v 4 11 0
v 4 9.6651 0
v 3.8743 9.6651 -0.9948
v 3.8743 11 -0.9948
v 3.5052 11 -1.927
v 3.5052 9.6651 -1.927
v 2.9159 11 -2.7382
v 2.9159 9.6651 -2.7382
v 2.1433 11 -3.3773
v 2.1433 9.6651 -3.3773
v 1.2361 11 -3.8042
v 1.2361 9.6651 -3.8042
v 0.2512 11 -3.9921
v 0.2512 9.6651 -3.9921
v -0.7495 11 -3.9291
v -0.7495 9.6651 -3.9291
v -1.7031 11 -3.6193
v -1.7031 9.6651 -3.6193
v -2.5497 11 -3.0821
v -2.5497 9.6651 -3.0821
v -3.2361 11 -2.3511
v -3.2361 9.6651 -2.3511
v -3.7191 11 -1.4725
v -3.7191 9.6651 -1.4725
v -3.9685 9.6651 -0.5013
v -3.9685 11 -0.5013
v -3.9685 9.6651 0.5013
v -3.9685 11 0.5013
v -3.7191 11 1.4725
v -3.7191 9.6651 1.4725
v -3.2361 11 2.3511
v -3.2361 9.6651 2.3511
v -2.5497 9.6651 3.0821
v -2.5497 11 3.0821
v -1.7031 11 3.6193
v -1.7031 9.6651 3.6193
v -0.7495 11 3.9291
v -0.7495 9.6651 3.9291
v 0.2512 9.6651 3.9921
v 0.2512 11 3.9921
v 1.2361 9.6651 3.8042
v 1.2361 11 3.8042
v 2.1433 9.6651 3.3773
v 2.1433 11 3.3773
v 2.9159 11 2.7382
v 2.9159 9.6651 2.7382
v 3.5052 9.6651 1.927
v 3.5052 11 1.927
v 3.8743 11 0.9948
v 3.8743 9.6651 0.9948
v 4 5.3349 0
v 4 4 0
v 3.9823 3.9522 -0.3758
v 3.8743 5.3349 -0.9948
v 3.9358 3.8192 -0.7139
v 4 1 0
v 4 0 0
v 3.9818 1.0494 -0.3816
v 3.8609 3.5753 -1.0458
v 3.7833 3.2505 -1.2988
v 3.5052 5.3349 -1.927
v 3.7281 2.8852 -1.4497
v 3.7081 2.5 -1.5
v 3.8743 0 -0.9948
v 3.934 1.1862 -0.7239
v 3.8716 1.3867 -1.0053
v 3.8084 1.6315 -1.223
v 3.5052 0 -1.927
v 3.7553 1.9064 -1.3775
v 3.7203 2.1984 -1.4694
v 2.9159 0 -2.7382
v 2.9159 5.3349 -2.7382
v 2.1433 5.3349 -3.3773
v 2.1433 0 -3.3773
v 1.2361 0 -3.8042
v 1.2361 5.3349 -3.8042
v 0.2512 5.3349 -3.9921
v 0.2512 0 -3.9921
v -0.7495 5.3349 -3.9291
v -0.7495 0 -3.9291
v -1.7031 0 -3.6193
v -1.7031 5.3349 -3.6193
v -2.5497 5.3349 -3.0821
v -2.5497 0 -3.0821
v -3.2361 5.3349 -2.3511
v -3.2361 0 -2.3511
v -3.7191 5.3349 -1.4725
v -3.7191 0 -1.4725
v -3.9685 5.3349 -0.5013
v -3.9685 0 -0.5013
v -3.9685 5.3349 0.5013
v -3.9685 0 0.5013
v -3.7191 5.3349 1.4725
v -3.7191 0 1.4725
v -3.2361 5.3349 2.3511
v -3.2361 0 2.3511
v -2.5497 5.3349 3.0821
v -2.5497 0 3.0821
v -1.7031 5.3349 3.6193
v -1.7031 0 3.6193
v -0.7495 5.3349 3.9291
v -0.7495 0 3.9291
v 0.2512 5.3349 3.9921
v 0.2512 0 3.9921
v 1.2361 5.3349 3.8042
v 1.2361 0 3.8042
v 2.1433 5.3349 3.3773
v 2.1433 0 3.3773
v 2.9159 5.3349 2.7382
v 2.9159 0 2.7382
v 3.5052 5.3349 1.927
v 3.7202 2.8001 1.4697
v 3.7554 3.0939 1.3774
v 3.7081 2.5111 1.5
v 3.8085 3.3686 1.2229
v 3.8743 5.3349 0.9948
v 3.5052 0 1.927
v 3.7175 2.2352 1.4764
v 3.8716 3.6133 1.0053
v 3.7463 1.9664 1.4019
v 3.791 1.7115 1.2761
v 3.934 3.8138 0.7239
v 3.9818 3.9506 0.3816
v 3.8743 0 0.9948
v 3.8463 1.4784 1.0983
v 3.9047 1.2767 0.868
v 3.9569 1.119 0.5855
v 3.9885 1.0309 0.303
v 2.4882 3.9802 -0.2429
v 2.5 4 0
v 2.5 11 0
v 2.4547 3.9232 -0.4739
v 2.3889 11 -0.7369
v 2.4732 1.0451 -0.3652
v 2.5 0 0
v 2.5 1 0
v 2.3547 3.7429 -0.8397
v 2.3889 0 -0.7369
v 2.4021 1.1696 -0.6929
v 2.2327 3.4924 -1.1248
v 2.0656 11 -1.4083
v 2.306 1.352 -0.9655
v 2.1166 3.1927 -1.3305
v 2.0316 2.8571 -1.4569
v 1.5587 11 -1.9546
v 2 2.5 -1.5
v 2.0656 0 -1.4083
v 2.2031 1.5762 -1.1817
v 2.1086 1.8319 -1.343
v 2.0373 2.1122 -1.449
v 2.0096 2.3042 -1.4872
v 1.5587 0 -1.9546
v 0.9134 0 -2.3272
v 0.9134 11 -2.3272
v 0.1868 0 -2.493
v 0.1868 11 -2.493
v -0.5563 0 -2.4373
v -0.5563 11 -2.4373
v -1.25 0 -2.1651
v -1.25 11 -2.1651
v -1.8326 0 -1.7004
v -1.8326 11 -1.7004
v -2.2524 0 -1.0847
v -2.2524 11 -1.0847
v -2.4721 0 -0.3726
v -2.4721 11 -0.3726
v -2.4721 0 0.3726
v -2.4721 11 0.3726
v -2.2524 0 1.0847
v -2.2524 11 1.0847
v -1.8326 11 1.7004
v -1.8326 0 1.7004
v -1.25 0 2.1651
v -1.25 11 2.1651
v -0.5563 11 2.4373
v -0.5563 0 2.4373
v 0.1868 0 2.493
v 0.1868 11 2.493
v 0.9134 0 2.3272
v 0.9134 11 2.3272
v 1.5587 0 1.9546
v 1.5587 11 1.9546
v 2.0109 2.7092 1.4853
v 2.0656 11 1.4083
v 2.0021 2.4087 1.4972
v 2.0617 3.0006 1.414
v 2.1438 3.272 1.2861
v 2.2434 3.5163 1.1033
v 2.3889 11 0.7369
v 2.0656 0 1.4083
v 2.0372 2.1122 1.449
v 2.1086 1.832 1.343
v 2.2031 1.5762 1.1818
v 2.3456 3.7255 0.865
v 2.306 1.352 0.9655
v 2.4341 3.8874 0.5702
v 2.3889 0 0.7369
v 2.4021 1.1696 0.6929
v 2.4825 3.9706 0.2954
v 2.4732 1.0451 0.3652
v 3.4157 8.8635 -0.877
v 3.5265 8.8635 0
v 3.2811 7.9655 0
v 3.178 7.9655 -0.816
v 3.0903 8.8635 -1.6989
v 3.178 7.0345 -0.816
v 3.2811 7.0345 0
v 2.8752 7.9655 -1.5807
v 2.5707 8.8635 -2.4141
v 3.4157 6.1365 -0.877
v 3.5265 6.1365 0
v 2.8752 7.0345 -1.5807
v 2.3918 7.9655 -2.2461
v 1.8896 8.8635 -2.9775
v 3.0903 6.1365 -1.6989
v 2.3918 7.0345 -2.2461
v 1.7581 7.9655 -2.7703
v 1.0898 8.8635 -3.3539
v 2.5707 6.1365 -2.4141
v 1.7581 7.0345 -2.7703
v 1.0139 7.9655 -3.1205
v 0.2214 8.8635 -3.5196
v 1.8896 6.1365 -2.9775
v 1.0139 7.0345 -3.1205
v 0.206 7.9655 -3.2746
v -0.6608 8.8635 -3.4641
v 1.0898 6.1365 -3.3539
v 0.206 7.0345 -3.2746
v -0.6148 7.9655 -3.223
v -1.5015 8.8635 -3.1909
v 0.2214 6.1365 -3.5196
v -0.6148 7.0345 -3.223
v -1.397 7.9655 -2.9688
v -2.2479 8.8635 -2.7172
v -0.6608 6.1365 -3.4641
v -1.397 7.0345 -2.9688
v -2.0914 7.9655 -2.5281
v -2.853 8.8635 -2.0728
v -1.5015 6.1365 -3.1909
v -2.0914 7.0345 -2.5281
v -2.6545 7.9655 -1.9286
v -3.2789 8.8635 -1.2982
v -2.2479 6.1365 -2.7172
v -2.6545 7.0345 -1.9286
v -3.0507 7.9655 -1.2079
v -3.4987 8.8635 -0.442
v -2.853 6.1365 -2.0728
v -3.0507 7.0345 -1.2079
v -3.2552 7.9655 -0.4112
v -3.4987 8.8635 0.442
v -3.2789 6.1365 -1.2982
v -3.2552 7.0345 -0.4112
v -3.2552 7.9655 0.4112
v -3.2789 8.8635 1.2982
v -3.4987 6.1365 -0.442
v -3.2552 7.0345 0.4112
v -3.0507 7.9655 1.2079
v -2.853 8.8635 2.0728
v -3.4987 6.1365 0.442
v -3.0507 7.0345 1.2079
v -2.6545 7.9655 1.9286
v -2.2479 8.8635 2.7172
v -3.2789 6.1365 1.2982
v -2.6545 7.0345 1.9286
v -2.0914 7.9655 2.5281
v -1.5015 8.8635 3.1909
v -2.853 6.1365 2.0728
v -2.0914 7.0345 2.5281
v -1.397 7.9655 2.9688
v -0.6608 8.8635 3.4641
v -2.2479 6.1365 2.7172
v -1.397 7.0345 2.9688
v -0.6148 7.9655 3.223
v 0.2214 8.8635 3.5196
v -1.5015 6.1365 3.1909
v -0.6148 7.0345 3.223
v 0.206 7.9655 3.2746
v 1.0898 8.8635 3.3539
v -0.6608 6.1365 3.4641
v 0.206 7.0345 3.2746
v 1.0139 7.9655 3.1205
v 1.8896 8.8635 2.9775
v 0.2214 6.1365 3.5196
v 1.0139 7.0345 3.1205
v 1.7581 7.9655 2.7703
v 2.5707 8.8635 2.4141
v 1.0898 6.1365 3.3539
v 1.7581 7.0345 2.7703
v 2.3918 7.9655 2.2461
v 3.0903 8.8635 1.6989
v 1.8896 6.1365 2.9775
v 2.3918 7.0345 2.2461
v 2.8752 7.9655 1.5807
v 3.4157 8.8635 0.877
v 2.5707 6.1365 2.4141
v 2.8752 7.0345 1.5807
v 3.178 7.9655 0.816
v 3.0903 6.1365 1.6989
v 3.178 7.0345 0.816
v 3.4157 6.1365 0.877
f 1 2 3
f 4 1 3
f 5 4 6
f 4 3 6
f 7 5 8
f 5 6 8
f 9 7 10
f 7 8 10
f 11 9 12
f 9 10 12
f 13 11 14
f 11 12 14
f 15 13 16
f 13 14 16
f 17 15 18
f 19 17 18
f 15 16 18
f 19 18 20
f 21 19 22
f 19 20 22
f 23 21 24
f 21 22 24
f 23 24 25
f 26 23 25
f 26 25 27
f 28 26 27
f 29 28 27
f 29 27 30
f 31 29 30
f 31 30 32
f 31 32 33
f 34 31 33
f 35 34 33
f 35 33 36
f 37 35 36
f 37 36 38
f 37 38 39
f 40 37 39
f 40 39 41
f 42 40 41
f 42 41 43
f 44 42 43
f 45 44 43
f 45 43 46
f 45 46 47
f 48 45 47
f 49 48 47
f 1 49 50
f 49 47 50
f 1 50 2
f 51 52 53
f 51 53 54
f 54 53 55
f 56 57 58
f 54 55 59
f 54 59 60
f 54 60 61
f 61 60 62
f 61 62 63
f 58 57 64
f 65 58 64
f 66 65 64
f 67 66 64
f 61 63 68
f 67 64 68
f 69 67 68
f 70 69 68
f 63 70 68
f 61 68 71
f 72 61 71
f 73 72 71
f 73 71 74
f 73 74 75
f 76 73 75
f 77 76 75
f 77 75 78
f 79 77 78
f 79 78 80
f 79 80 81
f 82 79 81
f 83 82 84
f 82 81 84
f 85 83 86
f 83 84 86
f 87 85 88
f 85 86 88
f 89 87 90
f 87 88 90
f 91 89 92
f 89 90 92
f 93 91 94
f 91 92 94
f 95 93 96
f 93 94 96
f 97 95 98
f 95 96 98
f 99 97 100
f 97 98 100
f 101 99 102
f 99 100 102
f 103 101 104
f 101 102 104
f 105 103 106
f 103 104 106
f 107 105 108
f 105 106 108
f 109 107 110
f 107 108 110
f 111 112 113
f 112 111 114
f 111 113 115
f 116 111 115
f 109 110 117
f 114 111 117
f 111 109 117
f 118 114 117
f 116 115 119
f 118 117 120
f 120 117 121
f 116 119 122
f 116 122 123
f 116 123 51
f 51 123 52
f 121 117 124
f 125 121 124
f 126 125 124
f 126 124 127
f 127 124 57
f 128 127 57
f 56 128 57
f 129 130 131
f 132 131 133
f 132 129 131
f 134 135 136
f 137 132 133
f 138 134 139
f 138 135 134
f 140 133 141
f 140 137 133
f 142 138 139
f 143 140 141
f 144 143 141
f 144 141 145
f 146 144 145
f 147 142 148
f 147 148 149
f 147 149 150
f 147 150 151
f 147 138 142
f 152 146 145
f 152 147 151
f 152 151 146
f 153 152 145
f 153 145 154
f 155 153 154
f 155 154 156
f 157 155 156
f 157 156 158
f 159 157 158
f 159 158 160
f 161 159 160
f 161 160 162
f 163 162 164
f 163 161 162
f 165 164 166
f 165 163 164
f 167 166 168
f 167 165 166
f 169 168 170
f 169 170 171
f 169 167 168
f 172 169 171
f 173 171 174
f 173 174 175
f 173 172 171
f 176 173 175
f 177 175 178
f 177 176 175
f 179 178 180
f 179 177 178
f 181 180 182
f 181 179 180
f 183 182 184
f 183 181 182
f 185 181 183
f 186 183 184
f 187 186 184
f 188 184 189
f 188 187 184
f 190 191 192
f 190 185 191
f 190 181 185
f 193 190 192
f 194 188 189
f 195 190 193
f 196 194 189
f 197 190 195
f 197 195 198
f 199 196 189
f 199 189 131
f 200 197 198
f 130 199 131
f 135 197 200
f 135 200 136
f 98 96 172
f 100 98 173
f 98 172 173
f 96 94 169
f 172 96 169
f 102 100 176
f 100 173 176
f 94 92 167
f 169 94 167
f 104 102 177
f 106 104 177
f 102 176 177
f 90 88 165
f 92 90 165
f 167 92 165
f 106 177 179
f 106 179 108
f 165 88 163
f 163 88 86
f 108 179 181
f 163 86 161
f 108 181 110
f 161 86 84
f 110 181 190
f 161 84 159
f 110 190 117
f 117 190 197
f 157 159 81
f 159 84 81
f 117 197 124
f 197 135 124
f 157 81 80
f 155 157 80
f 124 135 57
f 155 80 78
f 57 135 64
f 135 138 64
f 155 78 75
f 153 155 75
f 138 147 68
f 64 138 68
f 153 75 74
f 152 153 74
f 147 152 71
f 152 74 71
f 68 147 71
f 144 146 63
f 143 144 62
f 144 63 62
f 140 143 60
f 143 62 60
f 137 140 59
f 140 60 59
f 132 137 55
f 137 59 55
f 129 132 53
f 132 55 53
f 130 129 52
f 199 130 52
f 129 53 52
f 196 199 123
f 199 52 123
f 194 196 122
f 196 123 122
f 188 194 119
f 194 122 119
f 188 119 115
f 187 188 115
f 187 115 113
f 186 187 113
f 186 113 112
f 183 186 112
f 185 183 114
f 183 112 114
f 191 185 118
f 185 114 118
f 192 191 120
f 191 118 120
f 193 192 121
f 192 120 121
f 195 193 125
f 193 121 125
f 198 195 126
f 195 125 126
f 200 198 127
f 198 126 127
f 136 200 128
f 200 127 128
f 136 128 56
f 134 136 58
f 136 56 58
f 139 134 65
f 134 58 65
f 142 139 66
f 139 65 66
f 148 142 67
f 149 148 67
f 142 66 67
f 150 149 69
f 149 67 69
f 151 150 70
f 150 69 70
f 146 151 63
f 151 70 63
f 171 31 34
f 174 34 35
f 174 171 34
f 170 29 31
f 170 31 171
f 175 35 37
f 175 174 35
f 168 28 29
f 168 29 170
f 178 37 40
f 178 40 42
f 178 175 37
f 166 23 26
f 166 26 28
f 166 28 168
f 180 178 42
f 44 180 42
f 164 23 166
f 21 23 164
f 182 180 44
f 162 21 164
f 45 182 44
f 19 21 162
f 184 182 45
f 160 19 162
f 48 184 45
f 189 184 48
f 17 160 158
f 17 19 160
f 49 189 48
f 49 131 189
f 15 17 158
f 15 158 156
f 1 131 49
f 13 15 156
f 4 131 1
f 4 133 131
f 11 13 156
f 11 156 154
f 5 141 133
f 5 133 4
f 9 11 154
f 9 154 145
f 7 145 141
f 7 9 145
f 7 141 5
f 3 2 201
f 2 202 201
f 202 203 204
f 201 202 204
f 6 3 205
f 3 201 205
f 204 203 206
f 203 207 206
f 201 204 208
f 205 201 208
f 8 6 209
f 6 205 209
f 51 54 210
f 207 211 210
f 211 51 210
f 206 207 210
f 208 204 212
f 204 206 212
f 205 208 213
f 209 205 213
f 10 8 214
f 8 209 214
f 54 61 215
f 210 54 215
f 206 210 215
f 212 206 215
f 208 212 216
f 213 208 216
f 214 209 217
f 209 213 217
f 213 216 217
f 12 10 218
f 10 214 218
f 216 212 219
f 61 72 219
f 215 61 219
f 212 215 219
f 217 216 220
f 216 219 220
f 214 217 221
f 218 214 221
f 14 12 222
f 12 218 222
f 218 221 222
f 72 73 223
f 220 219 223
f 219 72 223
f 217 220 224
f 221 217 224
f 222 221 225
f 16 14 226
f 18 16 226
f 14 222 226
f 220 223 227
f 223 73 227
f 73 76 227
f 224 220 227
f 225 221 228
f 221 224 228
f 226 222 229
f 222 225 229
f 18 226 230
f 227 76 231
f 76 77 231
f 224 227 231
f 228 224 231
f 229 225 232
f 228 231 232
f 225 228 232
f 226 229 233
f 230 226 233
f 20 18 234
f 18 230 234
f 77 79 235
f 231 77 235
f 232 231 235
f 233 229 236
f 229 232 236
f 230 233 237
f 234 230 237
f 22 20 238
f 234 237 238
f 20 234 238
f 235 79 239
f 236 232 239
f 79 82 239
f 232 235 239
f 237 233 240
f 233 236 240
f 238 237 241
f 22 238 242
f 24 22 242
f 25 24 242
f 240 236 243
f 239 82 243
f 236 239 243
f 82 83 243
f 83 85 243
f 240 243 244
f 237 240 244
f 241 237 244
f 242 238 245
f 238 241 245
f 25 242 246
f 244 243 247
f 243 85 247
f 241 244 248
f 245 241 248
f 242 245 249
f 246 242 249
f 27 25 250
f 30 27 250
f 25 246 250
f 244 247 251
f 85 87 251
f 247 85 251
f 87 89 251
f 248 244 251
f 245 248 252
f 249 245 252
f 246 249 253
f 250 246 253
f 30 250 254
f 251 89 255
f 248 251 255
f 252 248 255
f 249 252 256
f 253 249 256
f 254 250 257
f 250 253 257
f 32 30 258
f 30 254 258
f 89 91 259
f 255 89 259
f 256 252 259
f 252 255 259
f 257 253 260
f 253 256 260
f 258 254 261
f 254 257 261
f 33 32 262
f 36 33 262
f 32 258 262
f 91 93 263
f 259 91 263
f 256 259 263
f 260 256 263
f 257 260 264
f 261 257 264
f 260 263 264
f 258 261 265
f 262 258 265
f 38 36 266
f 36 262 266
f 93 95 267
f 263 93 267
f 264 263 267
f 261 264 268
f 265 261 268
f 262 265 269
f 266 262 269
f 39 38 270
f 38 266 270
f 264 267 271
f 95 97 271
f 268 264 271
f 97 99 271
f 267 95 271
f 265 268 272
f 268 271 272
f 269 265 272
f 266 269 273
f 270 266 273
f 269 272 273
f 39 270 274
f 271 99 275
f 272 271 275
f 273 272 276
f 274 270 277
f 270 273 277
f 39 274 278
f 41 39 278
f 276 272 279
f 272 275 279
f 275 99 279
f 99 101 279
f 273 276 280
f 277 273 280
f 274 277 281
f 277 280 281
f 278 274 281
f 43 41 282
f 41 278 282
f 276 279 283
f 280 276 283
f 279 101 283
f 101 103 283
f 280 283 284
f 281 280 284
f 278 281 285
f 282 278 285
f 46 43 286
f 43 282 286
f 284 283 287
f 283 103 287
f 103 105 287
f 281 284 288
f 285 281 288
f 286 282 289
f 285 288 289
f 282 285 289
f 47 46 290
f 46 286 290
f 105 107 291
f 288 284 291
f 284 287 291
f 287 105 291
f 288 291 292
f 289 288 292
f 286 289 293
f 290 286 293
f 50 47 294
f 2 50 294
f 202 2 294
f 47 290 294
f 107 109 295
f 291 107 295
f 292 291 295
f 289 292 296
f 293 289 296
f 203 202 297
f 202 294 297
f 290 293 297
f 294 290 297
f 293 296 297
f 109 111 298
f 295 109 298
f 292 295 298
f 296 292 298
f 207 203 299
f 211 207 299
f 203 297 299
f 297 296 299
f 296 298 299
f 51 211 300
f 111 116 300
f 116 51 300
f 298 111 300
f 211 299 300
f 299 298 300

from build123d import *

# Parameters (mm, degrees)
CROQUIS1_R              = 4
CROQUIS1_R_2            = 2.5
SALIENTE_EXTRUIR1_DEPTH = 11
CROQUIS2_R              = 1.5
CORTAR_EXTRUIR2_DEPTH   = 2
CROQUIS3_R              = 3.5
CROQUIS3_R_2            = 3


with BuildPart() as part:
    # Croquis1 → Saliente-Extruir1 (new body)
    with BuildSketch(Plane(origin=(0, 0, 0), x_dir=(1, 0, 0), z_dir=(0, 1, 0))):
        Circle(CROQUIS1_R)
        Circle(CROQUIS1_R_2, mode=Mode.SUBTRACT)
    extrude(amount=SALIENTE_EXTRUIR1_DEPTH)

    # Croquis2 → Cortar-Extruir2 (cut)
    with BuildSketch(Plane(origin=(4, 0, 0), x_dir=(0, 0, -1), z_dir=(1, 0, 0))):
        with Locations((0, 2.5)):
            Circle(CROQUIS2_R)
    extrude(amount=-CORTAR_EXTRUIR2_DEPTH, mode=Mode.SUBTRACT)

    # Croquis3 → Cortar-Revolución2 (revolve, cut)
    with BuildSketch(Plane.XY):
        with Locations((6.75, 7.5)):
            Circle(CROQUIS3_R)
        with Locations((-6.75, 7.5)):
            Circle(CROQUIS3_R_2)
    revolve(axis=Axis((0, 0, 0), (0, 1, 0)), mode=Mode.SUBTRACT)


solid = part.part
